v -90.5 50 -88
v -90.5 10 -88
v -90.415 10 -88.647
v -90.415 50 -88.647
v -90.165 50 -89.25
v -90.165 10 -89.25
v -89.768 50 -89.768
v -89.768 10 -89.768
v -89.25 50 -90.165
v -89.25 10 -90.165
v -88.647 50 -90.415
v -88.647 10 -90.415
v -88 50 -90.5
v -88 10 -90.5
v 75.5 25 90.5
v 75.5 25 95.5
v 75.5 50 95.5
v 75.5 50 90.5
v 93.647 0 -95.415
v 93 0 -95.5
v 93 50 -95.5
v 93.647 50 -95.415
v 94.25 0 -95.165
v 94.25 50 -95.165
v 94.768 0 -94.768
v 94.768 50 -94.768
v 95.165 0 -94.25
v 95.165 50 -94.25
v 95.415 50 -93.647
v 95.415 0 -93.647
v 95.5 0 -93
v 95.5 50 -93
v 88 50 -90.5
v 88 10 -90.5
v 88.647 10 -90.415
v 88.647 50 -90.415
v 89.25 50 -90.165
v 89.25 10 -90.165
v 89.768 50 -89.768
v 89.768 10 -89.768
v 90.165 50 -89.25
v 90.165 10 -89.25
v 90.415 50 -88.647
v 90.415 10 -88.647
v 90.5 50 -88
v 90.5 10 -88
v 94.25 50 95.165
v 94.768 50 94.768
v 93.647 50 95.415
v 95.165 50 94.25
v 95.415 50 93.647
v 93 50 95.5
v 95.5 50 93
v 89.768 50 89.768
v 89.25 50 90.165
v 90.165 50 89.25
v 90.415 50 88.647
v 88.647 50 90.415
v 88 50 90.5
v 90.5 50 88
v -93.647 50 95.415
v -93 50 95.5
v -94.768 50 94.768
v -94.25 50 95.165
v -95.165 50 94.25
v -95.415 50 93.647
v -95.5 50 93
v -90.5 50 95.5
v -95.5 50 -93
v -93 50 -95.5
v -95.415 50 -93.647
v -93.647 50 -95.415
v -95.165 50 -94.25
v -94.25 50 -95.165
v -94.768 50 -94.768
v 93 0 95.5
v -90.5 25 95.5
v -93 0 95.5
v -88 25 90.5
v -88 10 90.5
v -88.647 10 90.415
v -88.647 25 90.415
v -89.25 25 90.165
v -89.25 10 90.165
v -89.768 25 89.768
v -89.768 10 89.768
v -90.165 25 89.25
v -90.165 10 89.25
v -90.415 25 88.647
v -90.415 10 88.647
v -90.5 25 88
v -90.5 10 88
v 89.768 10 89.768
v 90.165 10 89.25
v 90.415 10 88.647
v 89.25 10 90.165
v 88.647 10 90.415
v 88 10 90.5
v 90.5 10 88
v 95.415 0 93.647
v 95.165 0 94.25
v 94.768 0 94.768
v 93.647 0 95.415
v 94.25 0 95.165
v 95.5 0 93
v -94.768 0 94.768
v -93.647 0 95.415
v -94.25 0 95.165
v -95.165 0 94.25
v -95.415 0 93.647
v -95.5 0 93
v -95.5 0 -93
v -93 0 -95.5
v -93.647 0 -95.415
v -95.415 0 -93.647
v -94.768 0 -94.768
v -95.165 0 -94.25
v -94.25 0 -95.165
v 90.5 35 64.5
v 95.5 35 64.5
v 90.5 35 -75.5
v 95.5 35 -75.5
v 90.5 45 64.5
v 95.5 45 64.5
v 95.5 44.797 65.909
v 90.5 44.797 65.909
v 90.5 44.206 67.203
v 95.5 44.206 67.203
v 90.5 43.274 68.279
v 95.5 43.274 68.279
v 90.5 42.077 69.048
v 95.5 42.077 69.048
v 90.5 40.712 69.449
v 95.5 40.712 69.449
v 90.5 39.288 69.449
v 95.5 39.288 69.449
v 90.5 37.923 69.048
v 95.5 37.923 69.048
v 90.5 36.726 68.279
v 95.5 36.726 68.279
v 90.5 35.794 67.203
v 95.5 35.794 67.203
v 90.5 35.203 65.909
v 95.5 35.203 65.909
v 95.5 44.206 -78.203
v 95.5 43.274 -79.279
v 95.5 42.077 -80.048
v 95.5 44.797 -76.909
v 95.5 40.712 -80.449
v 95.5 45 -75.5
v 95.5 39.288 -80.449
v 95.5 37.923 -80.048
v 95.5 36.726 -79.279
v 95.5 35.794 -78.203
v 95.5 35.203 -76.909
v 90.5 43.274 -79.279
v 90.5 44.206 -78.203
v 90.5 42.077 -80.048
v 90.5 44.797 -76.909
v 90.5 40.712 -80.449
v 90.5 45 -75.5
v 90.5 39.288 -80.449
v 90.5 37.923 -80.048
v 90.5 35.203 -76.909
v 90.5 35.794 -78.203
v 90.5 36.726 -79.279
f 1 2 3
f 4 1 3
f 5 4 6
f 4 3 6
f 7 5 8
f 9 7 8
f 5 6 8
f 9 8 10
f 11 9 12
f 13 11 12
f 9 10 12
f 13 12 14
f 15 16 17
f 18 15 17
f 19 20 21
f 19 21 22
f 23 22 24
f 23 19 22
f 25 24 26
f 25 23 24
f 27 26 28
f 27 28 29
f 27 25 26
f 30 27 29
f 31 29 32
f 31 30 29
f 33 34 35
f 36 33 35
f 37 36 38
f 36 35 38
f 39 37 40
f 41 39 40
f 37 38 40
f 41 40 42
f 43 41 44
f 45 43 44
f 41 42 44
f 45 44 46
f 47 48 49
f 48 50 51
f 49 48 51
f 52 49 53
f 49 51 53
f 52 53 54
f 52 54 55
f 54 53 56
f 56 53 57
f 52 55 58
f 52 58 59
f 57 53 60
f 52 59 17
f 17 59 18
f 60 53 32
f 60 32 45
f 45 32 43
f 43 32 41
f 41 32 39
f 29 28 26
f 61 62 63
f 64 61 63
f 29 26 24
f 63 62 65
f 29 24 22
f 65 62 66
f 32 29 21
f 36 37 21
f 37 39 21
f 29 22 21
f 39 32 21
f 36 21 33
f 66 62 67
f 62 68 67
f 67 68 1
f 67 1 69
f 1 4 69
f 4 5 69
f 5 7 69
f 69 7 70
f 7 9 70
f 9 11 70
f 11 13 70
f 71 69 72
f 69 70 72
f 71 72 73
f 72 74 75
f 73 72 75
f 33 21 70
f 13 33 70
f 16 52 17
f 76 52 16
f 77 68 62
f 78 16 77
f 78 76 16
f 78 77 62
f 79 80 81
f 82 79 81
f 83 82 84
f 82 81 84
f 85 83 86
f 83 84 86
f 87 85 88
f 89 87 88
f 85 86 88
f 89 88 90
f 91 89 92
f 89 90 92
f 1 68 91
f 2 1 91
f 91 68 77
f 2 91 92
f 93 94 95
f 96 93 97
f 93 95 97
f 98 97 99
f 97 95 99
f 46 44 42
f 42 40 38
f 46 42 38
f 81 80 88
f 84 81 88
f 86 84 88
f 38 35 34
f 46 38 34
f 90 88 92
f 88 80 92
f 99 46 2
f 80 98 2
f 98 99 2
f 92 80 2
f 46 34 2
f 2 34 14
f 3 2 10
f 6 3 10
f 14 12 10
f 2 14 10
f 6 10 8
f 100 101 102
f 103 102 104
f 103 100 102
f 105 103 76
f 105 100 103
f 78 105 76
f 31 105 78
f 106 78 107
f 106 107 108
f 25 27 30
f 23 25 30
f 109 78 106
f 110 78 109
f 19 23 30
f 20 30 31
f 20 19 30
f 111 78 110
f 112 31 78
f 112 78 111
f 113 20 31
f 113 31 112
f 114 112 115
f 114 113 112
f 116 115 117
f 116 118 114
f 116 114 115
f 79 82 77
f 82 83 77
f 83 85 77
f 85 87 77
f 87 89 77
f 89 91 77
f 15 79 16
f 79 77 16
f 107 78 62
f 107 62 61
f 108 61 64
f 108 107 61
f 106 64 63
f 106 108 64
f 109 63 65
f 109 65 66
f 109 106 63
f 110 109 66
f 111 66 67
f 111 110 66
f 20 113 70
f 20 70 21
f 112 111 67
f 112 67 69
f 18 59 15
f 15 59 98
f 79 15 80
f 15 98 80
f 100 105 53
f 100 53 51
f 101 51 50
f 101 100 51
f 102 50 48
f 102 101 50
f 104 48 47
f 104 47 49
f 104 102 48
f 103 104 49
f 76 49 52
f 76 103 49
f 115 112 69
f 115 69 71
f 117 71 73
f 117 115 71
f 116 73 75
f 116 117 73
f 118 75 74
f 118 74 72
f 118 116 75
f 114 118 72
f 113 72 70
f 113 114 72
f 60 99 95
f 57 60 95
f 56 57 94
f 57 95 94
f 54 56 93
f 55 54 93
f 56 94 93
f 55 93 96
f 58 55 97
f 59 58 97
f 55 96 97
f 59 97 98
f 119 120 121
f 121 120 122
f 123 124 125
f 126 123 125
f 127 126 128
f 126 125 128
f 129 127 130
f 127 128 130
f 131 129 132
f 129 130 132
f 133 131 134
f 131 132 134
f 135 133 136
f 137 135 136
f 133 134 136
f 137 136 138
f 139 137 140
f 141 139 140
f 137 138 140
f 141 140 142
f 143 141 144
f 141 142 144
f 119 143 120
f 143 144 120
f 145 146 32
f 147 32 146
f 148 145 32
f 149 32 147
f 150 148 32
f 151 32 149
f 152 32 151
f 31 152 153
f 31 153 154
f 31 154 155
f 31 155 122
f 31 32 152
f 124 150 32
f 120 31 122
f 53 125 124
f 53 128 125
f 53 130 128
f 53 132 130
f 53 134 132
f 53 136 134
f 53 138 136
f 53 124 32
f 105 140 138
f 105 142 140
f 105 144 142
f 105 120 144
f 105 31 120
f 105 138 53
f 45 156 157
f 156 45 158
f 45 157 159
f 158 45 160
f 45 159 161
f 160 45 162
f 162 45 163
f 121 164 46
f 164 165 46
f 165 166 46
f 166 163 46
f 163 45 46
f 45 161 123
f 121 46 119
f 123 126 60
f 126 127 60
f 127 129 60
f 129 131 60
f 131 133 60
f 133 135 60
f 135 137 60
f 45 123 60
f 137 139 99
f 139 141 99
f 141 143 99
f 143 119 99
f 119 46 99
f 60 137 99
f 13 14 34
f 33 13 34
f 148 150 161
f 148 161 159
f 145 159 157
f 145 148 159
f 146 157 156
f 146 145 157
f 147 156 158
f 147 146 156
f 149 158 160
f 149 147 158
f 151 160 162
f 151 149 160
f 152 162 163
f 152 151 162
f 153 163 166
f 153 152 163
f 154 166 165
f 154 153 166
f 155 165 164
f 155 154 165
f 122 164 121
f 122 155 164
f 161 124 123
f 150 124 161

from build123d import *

# Parameters (mm, degrees)
BOSS_EXTRUDE2_DEPTH = 50
BOSS_EXTRUDE3_DEPTH = 10
CUT_EXTRUDE1_DEPTH  = 10
SKETCH4_W           = 140
SKETCH4_H           = 10
CUT_EXTRUDE2_DEPTH  = 10


with BuildPart() as part:
    # Sketch1 → Boss-Extrude2 (new body)
    with BuildSketch(Plane(origin=(0, 0, 0), x_dir=(1, 0, 0), z_dir=(0, 1, 0))):
        with BuildLine():
            Line((-93, 95.5), (93, 95.5))
            ThreePointArc((93, 95.5), (94.767766953, 94.767766953), (95.5, 93))
            Line((95.5, 93), (95.5, -93))
            ThreePointArc((95.5, -93), (94.767766953, -94.767766953), (93, -95.5))
            Line((93, -95.5), (-93, -95.5))
            ThreePointArc((-93, -95.5), (-94.767766953, -94.767766953), (-95.5, -93))
            Line((-95.5, -93), (-95.5, 93))
            ThreePointArc((-95.5, 93), (-94.767766953, 94.767766953), (-93, 95.5))
        make_face()
        with BuildLine():
            Line((-88, 90.5), (88, 90.5))
            ThreePointArc((88, 90.5), (89.767766953, 89.767766953), (90.5, 88))
            Line((90.5, 88), (90.5, -88))
            ThreePointArc((90.5, -88), (89.767766953, -89.767766953), (88, -90.5))
            Line((88, -90.5), (-88, -90.5))
            ThreePointArc((-88, -90.5), (-89.767766953, -89.767766953), (-90.5, -88))
            Line((-90.5, -88), (-90.5, 88))
            ThreePointArc((-90.5, 88), (-89.767766953, 89.767766953), (-88, 90.5))
        make_face(mode=Mode.SUBTRACT)
    extrude(amount=BOSS_EXTRUDE2_DEPTH)

    # Sketch2 → Boss-Extrude3 (add)
    with BuildSketch(Plane(origin=(0, 0, 0), x_dir=(1, 0, 0), z_dir=(0, 1, 0))):
        with BuildLine():
            Line((-88, 90.5), (88, 90.5))
            ThreePointArc((88, 90.5), (89.767766953, 89.767766953), (90.5, 88))
            Line((90.5, 88), (90.5, -88))
            ThreePointArc((90.5, -88), (89.767766953, -89.767766953), (88, -90.5))
            Line((88, -90.5), (-88, -90.5))
            ThreePointArc((-88, -90.5), (-89.767766953, -89.767766953), (-90.5, -88))
            Line((-90.5, -88), (-90.5, 88))
            ThreePointArc((-90.5, 88), (-89.767766953, 89.767766953), (-88, 90.5))
        make_face()
    extrude(amount=BOSS_EXTRUDE3_DEPTH)

    # Sketch3 → Cut-Extrude1 (cut)
    with BuildSketch(Plane.XY.offset(95.5)):
        Polygon((-90.5, 25), (0, 25), (75.5, 25), (75.5, 50), (-90.5, 50), align=None)
    extrude(amount=-CUT_EXTRUDE1_DEPTH, mode=Mode.SUBTRACT)

    # Sketch4 → Cut-Extrude2 (cut)
    with BuildSketch(Plane(origin=(95.5, 0, 0), x_dir=(0, 0, -1), z_dir=(1, 0, 0))):
        with Locations((5.5, 40)):
            Rectangle(SKETCH4_W, SKETCH4_H)
        with BuildLine():
            Line((75.5, 35), (75.5, 45))
            ThreePointArc((75.5, 45), (80.5, 40), (75.5, 35))
        make_face()
        with BuildLine():
            Line((-64.5, 35), (-64.5, 45))
            ThreePointArc((-64.5, 45), (-69.5, 40), (-64.5, 35))
        make_face()
    extrude(amount=-CUT_EXTRUDE2_DEPTH, mode=Mode.SUBTRACT)


solid = part.part
